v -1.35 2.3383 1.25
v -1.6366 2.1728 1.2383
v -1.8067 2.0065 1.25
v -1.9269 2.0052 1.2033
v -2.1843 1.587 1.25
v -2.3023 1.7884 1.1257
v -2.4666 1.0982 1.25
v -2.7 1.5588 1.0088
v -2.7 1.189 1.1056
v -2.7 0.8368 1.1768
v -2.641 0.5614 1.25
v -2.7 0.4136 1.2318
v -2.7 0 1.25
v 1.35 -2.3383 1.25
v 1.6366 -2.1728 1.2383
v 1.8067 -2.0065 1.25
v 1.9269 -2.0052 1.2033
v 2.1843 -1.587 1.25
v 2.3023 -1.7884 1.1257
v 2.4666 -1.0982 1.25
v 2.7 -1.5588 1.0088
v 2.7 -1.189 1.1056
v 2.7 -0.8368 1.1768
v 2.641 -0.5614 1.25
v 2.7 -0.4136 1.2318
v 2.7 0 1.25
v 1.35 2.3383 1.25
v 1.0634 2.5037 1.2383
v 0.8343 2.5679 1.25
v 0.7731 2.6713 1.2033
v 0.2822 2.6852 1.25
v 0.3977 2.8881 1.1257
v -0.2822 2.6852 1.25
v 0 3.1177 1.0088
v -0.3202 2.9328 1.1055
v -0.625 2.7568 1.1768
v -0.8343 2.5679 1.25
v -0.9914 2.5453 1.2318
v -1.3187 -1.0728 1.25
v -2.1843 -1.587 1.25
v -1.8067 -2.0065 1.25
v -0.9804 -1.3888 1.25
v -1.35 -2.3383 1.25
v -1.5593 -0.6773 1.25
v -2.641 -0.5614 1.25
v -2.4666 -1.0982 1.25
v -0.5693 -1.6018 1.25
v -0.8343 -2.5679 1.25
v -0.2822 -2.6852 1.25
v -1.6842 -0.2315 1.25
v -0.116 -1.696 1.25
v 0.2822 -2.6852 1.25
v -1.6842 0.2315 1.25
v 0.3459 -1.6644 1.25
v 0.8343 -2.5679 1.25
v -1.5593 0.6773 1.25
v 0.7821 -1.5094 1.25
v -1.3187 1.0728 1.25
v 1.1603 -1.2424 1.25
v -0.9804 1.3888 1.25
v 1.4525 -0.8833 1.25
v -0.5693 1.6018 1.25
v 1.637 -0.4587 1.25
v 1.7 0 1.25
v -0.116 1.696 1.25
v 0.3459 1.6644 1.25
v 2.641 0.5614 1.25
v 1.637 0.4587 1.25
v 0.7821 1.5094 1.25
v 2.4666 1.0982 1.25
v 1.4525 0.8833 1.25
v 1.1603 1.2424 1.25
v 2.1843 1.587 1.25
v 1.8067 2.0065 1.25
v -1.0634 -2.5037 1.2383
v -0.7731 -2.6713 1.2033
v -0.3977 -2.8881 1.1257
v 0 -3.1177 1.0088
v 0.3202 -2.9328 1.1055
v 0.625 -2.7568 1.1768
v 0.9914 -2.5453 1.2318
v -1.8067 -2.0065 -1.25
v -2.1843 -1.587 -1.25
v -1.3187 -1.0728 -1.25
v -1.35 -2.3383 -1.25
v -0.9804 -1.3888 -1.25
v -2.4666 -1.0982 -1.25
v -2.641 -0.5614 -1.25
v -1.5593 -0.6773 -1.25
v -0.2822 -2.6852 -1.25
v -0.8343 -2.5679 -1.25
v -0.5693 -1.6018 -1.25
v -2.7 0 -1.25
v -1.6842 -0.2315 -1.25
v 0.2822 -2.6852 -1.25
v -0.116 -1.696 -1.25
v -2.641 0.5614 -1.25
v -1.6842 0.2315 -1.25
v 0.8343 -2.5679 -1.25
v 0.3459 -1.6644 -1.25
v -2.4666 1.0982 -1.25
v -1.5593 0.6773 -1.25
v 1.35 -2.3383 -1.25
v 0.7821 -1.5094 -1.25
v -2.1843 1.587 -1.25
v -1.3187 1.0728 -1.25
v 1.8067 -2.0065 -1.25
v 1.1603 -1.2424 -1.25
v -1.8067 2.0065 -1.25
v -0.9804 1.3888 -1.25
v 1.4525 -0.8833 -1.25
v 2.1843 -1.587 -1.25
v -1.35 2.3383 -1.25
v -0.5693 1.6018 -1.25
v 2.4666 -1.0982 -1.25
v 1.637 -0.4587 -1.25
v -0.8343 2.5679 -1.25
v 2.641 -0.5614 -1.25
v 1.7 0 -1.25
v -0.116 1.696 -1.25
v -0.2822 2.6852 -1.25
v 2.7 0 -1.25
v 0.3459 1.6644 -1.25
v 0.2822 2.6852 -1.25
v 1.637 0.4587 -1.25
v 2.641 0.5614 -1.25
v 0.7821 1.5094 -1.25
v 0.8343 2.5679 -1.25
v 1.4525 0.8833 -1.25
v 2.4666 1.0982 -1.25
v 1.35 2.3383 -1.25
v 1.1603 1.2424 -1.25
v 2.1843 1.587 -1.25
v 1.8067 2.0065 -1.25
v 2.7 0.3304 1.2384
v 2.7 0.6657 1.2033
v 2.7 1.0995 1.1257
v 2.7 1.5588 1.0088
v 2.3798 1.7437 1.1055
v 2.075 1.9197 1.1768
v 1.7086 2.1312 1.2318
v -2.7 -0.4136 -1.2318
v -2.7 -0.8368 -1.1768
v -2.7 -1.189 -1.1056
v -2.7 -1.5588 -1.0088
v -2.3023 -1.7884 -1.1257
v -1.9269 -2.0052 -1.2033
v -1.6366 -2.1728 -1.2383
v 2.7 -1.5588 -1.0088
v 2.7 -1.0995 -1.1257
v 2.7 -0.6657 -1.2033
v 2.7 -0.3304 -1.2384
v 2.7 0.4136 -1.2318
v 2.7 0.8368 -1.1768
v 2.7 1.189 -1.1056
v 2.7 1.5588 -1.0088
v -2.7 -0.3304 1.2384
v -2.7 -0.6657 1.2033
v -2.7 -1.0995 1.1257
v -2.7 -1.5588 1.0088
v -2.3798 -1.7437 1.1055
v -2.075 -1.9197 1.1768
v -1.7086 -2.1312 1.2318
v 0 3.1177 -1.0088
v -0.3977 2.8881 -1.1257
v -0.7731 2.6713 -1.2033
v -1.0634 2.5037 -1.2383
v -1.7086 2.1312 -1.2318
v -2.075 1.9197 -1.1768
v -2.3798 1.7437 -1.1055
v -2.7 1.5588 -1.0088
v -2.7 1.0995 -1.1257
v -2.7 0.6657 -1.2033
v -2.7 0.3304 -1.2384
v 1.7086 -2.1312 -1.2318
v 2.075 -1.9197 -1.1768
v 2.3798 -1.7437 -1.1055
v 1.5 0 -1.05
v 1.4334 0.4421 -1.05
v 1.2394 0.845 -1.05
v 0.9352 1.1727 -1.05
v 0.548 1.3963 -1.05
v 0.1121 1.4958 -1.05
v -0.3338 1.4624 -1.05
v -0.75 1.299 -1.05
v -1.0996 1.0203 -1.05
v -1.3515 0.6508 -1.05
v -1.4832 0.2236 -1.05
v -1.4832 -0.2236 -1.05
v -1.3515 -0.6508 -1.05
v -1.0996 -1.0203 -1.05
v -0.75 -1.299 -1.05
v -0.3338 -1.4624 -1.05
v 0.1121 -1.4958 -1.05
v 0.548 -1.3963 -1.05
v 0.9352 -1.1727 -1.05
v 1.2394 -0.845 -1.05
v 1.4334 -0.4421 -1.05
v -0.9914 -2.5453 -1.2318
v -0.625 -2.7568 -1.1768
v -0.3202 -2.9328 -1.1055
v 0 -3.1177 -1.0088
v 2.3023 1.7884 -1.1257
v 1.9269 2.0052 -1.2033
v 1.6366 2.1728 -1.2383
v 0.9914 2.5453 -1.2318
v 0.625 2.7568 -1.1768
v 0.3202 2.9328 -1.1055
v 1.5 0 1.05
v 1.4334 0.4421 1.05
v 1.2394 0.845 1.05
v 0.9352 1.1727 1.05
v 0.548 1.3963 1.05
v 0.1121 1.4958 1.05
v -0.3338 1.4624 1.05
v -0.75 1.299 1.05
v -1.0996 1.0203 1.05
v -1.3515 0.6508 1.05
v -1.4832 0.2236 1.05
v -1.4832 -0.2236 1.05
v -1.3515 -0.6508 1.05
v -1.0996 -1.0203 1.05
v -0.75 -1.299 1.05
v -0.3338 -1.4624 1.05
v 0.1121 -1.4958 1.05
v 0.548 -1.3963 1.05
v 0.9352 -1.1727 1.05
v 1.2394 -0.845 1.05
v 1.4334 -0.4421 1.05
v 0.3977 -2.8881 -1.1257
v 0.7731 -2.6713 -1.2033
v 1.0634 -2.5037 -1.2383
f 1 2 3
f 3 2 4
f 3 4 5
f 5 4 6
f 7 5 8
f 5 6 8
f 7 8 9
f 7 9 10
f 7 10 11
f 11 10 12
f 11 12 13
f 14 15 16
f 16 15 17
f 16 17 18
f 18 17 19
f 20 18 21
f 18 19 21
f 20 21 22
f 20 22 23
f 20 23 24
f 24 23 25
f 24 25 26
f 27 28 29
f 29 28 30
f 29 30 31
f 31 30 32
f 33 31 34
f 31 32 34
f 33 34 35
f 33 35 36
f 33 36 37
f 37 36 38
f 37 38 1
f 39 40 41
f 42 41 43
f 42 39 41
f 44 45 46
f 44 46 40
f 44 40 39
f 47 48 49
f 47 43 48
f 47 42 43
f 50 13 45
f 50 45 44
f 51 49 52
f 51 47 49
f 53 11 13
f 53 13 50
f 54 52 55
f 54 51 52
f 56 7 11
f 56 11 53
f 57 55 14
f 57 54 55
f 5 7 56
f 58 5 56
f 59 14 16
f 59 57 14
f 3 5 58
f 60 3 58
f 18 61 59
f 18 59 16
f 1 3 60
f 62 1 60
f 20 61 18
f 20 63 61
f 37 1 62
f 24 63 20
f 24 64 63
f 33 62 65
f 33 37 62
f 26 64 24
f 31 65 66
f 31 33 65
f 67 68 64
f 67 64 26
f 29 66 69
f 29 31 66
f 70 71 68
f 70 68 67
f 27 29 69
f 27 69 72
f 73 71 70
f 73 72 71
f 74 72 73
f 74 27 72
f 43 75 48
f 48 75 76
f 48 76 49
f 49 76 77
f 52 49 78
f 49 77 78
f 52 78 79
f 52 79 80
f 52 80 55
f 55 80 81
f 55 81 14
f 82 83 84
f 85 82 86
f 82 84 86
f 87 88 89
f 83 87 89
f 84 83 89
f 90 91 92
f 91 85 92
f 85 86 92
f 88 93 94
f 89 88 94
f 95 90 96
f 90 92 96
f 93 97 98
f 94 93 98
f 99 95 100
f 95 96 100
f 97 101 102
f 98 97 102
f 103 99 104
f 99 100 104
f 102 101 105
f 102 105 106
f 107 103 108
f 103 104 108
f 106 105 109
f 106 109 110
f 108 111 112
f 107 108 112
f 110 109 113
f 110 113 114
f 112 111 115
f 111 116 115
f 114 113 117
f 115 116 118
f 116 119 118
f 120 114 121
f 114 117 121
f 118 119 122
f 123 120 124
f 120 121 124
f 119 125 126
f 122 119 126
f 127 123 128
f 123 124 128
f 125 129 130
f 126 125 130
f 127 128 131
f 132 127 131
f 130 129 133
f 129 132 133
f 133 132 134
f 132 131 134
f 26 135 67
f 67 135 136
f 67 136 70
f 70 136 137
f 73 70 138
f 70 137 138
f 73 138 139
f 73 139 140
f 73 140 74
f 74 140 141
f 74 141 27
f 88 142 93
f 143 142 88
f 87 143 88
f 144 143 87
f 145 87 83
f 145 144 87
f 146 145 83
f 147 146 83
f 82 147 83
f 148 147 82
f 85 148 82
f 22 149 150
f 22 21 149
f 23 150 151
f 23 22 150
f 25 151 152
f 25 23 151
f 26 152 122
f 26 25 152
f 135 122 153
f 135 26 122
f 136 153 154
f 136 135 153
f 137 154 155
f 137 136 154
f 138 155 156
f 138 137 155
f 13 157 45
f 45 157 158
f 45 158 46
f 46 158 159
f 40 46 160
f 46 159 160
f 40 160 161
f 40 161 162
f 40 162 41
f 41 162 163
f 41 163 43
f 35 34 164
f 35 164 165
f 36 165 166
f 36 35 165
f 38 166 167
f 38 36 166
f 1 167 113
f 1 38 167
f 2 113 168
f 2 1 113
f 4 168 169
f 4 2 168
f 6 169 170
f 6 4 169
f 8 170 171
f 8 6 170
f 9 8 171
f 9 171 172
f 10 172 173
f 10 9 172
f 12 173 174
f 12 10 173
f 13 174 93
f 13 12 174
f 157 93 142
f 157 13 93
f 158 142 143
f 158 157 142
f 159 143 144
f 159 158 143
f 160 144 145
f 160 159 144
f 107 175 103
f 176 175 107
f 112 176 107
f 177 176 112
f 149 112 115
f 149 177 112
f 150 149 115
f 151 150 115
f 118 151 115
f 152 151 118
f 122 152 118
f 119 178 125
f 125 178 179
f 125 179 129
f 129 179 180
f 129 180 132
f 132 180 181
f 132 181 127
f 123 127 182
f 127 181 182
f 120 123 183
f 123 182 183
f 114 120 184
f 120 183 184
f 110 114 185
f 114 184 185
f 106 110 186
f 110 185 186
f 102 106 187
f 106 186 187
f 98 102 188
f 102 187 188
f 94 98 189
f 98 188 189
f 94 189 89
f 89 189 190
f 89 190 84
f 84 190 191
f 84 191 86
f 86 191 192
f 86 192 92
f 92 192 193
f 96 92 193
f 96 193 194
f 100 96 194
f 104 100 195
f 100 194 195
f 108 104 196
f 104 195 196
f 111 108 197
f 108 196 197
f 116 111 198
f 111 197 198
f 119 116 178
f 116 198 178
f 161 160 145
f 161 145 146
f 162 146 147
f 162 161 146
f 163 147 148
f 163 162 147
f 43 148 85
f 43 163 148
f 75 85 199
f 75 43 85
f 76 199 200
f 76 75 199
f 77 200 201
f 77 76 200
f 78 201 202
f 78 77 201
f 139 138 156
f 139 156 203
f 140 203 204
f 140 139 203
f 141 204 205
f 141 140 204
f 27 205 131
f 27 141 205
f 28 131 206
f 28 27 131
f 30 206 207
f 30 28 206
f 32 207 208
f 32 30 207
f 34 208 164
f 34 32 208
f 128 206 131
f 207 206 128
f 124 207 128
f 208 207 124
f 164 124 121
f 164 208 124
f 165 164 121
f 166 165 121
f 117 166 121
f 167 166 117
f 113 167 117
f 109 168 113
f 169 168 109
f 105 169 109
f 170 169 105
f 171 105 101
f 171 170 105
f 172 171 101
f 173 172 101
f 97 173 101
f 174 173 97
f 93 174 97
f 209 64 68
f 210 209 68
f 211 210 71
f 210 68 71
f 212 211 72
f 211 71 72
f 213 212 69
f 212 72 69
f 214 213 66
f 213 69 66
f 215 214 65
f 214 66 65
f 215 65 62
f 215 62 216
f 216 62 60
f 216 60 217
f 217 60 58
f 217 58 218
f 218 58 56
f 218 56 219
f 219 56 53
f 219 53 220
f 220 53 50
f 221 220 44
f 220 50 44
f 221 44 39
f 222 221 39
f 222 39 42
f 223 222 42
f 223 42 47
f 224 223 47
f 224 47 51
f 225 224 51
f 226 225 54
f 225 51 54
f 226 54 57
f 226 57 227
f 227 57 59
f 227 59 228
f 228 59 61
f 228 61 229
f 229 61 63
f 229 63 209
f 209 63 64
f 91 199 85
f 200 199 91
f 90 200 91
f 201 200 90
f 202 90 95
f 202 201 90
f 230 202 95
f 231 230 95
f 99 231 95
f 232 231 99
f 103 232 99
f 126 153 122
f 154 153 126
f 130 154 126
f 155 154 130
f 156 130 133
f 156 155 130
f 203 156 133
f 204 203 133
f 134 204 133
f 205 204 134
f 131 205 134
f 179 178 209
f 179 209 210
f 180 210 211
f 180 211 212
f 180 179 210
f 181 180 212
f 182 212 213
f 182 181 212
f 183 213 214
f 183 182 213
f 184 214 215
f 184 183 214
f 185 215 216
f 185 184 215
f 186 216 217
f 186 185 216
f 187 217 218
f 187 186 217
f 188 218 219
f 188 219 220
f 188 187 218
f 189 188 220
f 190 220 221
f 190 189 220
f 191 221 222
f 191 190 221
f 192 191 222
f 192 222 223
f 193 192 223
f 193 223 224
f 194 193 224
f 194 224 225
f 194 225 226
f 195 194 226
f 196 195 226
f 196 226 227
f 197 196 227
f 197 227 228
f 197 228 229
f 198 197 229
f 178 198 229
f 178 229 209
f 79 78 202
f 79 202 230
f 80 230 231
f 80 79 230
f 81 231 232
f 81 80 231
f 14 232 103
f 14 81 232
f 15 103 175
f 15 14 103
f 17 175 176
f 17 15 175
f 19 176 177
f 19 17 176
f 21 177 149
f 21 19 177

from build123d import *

# Parameters (mm, degrees)
SKETCH_R     = 1.5
PAD_DEPTH    = 1.25
CHAMFER_SIZE = 0.2


with BuildPart() as part:
    # Sketch → Pad (new body, symmetric)
    with BuildSketch(Plane.XY):
        Polygon((2.7, -1.558846), (2.7, 1.558846), (0, 3.117691), (-2.7, 1.558846), (-2.7, -1.558846), (0, -3.117691), align=None)
        Circle(SKETCH_R, mode=Mode.SUBTRACT)
    extrude(amount=PAD_DEPTH, both=True)

    # Sketch001 → Groove (revolve, cut)
    with BuildSketch(Plane.YZ):
        Polygon((-2.7, 1.25), (-3.5, 0.78812), (-3.5, 1.25), align=None)
        Polygon((-2.7, -1.25), (-3.5, -0.78812), (-3.5, -1.25), align=None)
    revolve(axis=Axis((0, 0, 0), (0, 0, 1)), mode=Mode.SUBTRACT)

    # Chamfer
    chamfer_edges = [part.edges().sort_by_distance(p)[0] for p in [
        (-1.5, 0, 1.25),
        (-1.5, 0, -1.25),
    ]]
    chamfer(chamfer_edges, length=CHAMFER_SIZE)


solid = part.part
